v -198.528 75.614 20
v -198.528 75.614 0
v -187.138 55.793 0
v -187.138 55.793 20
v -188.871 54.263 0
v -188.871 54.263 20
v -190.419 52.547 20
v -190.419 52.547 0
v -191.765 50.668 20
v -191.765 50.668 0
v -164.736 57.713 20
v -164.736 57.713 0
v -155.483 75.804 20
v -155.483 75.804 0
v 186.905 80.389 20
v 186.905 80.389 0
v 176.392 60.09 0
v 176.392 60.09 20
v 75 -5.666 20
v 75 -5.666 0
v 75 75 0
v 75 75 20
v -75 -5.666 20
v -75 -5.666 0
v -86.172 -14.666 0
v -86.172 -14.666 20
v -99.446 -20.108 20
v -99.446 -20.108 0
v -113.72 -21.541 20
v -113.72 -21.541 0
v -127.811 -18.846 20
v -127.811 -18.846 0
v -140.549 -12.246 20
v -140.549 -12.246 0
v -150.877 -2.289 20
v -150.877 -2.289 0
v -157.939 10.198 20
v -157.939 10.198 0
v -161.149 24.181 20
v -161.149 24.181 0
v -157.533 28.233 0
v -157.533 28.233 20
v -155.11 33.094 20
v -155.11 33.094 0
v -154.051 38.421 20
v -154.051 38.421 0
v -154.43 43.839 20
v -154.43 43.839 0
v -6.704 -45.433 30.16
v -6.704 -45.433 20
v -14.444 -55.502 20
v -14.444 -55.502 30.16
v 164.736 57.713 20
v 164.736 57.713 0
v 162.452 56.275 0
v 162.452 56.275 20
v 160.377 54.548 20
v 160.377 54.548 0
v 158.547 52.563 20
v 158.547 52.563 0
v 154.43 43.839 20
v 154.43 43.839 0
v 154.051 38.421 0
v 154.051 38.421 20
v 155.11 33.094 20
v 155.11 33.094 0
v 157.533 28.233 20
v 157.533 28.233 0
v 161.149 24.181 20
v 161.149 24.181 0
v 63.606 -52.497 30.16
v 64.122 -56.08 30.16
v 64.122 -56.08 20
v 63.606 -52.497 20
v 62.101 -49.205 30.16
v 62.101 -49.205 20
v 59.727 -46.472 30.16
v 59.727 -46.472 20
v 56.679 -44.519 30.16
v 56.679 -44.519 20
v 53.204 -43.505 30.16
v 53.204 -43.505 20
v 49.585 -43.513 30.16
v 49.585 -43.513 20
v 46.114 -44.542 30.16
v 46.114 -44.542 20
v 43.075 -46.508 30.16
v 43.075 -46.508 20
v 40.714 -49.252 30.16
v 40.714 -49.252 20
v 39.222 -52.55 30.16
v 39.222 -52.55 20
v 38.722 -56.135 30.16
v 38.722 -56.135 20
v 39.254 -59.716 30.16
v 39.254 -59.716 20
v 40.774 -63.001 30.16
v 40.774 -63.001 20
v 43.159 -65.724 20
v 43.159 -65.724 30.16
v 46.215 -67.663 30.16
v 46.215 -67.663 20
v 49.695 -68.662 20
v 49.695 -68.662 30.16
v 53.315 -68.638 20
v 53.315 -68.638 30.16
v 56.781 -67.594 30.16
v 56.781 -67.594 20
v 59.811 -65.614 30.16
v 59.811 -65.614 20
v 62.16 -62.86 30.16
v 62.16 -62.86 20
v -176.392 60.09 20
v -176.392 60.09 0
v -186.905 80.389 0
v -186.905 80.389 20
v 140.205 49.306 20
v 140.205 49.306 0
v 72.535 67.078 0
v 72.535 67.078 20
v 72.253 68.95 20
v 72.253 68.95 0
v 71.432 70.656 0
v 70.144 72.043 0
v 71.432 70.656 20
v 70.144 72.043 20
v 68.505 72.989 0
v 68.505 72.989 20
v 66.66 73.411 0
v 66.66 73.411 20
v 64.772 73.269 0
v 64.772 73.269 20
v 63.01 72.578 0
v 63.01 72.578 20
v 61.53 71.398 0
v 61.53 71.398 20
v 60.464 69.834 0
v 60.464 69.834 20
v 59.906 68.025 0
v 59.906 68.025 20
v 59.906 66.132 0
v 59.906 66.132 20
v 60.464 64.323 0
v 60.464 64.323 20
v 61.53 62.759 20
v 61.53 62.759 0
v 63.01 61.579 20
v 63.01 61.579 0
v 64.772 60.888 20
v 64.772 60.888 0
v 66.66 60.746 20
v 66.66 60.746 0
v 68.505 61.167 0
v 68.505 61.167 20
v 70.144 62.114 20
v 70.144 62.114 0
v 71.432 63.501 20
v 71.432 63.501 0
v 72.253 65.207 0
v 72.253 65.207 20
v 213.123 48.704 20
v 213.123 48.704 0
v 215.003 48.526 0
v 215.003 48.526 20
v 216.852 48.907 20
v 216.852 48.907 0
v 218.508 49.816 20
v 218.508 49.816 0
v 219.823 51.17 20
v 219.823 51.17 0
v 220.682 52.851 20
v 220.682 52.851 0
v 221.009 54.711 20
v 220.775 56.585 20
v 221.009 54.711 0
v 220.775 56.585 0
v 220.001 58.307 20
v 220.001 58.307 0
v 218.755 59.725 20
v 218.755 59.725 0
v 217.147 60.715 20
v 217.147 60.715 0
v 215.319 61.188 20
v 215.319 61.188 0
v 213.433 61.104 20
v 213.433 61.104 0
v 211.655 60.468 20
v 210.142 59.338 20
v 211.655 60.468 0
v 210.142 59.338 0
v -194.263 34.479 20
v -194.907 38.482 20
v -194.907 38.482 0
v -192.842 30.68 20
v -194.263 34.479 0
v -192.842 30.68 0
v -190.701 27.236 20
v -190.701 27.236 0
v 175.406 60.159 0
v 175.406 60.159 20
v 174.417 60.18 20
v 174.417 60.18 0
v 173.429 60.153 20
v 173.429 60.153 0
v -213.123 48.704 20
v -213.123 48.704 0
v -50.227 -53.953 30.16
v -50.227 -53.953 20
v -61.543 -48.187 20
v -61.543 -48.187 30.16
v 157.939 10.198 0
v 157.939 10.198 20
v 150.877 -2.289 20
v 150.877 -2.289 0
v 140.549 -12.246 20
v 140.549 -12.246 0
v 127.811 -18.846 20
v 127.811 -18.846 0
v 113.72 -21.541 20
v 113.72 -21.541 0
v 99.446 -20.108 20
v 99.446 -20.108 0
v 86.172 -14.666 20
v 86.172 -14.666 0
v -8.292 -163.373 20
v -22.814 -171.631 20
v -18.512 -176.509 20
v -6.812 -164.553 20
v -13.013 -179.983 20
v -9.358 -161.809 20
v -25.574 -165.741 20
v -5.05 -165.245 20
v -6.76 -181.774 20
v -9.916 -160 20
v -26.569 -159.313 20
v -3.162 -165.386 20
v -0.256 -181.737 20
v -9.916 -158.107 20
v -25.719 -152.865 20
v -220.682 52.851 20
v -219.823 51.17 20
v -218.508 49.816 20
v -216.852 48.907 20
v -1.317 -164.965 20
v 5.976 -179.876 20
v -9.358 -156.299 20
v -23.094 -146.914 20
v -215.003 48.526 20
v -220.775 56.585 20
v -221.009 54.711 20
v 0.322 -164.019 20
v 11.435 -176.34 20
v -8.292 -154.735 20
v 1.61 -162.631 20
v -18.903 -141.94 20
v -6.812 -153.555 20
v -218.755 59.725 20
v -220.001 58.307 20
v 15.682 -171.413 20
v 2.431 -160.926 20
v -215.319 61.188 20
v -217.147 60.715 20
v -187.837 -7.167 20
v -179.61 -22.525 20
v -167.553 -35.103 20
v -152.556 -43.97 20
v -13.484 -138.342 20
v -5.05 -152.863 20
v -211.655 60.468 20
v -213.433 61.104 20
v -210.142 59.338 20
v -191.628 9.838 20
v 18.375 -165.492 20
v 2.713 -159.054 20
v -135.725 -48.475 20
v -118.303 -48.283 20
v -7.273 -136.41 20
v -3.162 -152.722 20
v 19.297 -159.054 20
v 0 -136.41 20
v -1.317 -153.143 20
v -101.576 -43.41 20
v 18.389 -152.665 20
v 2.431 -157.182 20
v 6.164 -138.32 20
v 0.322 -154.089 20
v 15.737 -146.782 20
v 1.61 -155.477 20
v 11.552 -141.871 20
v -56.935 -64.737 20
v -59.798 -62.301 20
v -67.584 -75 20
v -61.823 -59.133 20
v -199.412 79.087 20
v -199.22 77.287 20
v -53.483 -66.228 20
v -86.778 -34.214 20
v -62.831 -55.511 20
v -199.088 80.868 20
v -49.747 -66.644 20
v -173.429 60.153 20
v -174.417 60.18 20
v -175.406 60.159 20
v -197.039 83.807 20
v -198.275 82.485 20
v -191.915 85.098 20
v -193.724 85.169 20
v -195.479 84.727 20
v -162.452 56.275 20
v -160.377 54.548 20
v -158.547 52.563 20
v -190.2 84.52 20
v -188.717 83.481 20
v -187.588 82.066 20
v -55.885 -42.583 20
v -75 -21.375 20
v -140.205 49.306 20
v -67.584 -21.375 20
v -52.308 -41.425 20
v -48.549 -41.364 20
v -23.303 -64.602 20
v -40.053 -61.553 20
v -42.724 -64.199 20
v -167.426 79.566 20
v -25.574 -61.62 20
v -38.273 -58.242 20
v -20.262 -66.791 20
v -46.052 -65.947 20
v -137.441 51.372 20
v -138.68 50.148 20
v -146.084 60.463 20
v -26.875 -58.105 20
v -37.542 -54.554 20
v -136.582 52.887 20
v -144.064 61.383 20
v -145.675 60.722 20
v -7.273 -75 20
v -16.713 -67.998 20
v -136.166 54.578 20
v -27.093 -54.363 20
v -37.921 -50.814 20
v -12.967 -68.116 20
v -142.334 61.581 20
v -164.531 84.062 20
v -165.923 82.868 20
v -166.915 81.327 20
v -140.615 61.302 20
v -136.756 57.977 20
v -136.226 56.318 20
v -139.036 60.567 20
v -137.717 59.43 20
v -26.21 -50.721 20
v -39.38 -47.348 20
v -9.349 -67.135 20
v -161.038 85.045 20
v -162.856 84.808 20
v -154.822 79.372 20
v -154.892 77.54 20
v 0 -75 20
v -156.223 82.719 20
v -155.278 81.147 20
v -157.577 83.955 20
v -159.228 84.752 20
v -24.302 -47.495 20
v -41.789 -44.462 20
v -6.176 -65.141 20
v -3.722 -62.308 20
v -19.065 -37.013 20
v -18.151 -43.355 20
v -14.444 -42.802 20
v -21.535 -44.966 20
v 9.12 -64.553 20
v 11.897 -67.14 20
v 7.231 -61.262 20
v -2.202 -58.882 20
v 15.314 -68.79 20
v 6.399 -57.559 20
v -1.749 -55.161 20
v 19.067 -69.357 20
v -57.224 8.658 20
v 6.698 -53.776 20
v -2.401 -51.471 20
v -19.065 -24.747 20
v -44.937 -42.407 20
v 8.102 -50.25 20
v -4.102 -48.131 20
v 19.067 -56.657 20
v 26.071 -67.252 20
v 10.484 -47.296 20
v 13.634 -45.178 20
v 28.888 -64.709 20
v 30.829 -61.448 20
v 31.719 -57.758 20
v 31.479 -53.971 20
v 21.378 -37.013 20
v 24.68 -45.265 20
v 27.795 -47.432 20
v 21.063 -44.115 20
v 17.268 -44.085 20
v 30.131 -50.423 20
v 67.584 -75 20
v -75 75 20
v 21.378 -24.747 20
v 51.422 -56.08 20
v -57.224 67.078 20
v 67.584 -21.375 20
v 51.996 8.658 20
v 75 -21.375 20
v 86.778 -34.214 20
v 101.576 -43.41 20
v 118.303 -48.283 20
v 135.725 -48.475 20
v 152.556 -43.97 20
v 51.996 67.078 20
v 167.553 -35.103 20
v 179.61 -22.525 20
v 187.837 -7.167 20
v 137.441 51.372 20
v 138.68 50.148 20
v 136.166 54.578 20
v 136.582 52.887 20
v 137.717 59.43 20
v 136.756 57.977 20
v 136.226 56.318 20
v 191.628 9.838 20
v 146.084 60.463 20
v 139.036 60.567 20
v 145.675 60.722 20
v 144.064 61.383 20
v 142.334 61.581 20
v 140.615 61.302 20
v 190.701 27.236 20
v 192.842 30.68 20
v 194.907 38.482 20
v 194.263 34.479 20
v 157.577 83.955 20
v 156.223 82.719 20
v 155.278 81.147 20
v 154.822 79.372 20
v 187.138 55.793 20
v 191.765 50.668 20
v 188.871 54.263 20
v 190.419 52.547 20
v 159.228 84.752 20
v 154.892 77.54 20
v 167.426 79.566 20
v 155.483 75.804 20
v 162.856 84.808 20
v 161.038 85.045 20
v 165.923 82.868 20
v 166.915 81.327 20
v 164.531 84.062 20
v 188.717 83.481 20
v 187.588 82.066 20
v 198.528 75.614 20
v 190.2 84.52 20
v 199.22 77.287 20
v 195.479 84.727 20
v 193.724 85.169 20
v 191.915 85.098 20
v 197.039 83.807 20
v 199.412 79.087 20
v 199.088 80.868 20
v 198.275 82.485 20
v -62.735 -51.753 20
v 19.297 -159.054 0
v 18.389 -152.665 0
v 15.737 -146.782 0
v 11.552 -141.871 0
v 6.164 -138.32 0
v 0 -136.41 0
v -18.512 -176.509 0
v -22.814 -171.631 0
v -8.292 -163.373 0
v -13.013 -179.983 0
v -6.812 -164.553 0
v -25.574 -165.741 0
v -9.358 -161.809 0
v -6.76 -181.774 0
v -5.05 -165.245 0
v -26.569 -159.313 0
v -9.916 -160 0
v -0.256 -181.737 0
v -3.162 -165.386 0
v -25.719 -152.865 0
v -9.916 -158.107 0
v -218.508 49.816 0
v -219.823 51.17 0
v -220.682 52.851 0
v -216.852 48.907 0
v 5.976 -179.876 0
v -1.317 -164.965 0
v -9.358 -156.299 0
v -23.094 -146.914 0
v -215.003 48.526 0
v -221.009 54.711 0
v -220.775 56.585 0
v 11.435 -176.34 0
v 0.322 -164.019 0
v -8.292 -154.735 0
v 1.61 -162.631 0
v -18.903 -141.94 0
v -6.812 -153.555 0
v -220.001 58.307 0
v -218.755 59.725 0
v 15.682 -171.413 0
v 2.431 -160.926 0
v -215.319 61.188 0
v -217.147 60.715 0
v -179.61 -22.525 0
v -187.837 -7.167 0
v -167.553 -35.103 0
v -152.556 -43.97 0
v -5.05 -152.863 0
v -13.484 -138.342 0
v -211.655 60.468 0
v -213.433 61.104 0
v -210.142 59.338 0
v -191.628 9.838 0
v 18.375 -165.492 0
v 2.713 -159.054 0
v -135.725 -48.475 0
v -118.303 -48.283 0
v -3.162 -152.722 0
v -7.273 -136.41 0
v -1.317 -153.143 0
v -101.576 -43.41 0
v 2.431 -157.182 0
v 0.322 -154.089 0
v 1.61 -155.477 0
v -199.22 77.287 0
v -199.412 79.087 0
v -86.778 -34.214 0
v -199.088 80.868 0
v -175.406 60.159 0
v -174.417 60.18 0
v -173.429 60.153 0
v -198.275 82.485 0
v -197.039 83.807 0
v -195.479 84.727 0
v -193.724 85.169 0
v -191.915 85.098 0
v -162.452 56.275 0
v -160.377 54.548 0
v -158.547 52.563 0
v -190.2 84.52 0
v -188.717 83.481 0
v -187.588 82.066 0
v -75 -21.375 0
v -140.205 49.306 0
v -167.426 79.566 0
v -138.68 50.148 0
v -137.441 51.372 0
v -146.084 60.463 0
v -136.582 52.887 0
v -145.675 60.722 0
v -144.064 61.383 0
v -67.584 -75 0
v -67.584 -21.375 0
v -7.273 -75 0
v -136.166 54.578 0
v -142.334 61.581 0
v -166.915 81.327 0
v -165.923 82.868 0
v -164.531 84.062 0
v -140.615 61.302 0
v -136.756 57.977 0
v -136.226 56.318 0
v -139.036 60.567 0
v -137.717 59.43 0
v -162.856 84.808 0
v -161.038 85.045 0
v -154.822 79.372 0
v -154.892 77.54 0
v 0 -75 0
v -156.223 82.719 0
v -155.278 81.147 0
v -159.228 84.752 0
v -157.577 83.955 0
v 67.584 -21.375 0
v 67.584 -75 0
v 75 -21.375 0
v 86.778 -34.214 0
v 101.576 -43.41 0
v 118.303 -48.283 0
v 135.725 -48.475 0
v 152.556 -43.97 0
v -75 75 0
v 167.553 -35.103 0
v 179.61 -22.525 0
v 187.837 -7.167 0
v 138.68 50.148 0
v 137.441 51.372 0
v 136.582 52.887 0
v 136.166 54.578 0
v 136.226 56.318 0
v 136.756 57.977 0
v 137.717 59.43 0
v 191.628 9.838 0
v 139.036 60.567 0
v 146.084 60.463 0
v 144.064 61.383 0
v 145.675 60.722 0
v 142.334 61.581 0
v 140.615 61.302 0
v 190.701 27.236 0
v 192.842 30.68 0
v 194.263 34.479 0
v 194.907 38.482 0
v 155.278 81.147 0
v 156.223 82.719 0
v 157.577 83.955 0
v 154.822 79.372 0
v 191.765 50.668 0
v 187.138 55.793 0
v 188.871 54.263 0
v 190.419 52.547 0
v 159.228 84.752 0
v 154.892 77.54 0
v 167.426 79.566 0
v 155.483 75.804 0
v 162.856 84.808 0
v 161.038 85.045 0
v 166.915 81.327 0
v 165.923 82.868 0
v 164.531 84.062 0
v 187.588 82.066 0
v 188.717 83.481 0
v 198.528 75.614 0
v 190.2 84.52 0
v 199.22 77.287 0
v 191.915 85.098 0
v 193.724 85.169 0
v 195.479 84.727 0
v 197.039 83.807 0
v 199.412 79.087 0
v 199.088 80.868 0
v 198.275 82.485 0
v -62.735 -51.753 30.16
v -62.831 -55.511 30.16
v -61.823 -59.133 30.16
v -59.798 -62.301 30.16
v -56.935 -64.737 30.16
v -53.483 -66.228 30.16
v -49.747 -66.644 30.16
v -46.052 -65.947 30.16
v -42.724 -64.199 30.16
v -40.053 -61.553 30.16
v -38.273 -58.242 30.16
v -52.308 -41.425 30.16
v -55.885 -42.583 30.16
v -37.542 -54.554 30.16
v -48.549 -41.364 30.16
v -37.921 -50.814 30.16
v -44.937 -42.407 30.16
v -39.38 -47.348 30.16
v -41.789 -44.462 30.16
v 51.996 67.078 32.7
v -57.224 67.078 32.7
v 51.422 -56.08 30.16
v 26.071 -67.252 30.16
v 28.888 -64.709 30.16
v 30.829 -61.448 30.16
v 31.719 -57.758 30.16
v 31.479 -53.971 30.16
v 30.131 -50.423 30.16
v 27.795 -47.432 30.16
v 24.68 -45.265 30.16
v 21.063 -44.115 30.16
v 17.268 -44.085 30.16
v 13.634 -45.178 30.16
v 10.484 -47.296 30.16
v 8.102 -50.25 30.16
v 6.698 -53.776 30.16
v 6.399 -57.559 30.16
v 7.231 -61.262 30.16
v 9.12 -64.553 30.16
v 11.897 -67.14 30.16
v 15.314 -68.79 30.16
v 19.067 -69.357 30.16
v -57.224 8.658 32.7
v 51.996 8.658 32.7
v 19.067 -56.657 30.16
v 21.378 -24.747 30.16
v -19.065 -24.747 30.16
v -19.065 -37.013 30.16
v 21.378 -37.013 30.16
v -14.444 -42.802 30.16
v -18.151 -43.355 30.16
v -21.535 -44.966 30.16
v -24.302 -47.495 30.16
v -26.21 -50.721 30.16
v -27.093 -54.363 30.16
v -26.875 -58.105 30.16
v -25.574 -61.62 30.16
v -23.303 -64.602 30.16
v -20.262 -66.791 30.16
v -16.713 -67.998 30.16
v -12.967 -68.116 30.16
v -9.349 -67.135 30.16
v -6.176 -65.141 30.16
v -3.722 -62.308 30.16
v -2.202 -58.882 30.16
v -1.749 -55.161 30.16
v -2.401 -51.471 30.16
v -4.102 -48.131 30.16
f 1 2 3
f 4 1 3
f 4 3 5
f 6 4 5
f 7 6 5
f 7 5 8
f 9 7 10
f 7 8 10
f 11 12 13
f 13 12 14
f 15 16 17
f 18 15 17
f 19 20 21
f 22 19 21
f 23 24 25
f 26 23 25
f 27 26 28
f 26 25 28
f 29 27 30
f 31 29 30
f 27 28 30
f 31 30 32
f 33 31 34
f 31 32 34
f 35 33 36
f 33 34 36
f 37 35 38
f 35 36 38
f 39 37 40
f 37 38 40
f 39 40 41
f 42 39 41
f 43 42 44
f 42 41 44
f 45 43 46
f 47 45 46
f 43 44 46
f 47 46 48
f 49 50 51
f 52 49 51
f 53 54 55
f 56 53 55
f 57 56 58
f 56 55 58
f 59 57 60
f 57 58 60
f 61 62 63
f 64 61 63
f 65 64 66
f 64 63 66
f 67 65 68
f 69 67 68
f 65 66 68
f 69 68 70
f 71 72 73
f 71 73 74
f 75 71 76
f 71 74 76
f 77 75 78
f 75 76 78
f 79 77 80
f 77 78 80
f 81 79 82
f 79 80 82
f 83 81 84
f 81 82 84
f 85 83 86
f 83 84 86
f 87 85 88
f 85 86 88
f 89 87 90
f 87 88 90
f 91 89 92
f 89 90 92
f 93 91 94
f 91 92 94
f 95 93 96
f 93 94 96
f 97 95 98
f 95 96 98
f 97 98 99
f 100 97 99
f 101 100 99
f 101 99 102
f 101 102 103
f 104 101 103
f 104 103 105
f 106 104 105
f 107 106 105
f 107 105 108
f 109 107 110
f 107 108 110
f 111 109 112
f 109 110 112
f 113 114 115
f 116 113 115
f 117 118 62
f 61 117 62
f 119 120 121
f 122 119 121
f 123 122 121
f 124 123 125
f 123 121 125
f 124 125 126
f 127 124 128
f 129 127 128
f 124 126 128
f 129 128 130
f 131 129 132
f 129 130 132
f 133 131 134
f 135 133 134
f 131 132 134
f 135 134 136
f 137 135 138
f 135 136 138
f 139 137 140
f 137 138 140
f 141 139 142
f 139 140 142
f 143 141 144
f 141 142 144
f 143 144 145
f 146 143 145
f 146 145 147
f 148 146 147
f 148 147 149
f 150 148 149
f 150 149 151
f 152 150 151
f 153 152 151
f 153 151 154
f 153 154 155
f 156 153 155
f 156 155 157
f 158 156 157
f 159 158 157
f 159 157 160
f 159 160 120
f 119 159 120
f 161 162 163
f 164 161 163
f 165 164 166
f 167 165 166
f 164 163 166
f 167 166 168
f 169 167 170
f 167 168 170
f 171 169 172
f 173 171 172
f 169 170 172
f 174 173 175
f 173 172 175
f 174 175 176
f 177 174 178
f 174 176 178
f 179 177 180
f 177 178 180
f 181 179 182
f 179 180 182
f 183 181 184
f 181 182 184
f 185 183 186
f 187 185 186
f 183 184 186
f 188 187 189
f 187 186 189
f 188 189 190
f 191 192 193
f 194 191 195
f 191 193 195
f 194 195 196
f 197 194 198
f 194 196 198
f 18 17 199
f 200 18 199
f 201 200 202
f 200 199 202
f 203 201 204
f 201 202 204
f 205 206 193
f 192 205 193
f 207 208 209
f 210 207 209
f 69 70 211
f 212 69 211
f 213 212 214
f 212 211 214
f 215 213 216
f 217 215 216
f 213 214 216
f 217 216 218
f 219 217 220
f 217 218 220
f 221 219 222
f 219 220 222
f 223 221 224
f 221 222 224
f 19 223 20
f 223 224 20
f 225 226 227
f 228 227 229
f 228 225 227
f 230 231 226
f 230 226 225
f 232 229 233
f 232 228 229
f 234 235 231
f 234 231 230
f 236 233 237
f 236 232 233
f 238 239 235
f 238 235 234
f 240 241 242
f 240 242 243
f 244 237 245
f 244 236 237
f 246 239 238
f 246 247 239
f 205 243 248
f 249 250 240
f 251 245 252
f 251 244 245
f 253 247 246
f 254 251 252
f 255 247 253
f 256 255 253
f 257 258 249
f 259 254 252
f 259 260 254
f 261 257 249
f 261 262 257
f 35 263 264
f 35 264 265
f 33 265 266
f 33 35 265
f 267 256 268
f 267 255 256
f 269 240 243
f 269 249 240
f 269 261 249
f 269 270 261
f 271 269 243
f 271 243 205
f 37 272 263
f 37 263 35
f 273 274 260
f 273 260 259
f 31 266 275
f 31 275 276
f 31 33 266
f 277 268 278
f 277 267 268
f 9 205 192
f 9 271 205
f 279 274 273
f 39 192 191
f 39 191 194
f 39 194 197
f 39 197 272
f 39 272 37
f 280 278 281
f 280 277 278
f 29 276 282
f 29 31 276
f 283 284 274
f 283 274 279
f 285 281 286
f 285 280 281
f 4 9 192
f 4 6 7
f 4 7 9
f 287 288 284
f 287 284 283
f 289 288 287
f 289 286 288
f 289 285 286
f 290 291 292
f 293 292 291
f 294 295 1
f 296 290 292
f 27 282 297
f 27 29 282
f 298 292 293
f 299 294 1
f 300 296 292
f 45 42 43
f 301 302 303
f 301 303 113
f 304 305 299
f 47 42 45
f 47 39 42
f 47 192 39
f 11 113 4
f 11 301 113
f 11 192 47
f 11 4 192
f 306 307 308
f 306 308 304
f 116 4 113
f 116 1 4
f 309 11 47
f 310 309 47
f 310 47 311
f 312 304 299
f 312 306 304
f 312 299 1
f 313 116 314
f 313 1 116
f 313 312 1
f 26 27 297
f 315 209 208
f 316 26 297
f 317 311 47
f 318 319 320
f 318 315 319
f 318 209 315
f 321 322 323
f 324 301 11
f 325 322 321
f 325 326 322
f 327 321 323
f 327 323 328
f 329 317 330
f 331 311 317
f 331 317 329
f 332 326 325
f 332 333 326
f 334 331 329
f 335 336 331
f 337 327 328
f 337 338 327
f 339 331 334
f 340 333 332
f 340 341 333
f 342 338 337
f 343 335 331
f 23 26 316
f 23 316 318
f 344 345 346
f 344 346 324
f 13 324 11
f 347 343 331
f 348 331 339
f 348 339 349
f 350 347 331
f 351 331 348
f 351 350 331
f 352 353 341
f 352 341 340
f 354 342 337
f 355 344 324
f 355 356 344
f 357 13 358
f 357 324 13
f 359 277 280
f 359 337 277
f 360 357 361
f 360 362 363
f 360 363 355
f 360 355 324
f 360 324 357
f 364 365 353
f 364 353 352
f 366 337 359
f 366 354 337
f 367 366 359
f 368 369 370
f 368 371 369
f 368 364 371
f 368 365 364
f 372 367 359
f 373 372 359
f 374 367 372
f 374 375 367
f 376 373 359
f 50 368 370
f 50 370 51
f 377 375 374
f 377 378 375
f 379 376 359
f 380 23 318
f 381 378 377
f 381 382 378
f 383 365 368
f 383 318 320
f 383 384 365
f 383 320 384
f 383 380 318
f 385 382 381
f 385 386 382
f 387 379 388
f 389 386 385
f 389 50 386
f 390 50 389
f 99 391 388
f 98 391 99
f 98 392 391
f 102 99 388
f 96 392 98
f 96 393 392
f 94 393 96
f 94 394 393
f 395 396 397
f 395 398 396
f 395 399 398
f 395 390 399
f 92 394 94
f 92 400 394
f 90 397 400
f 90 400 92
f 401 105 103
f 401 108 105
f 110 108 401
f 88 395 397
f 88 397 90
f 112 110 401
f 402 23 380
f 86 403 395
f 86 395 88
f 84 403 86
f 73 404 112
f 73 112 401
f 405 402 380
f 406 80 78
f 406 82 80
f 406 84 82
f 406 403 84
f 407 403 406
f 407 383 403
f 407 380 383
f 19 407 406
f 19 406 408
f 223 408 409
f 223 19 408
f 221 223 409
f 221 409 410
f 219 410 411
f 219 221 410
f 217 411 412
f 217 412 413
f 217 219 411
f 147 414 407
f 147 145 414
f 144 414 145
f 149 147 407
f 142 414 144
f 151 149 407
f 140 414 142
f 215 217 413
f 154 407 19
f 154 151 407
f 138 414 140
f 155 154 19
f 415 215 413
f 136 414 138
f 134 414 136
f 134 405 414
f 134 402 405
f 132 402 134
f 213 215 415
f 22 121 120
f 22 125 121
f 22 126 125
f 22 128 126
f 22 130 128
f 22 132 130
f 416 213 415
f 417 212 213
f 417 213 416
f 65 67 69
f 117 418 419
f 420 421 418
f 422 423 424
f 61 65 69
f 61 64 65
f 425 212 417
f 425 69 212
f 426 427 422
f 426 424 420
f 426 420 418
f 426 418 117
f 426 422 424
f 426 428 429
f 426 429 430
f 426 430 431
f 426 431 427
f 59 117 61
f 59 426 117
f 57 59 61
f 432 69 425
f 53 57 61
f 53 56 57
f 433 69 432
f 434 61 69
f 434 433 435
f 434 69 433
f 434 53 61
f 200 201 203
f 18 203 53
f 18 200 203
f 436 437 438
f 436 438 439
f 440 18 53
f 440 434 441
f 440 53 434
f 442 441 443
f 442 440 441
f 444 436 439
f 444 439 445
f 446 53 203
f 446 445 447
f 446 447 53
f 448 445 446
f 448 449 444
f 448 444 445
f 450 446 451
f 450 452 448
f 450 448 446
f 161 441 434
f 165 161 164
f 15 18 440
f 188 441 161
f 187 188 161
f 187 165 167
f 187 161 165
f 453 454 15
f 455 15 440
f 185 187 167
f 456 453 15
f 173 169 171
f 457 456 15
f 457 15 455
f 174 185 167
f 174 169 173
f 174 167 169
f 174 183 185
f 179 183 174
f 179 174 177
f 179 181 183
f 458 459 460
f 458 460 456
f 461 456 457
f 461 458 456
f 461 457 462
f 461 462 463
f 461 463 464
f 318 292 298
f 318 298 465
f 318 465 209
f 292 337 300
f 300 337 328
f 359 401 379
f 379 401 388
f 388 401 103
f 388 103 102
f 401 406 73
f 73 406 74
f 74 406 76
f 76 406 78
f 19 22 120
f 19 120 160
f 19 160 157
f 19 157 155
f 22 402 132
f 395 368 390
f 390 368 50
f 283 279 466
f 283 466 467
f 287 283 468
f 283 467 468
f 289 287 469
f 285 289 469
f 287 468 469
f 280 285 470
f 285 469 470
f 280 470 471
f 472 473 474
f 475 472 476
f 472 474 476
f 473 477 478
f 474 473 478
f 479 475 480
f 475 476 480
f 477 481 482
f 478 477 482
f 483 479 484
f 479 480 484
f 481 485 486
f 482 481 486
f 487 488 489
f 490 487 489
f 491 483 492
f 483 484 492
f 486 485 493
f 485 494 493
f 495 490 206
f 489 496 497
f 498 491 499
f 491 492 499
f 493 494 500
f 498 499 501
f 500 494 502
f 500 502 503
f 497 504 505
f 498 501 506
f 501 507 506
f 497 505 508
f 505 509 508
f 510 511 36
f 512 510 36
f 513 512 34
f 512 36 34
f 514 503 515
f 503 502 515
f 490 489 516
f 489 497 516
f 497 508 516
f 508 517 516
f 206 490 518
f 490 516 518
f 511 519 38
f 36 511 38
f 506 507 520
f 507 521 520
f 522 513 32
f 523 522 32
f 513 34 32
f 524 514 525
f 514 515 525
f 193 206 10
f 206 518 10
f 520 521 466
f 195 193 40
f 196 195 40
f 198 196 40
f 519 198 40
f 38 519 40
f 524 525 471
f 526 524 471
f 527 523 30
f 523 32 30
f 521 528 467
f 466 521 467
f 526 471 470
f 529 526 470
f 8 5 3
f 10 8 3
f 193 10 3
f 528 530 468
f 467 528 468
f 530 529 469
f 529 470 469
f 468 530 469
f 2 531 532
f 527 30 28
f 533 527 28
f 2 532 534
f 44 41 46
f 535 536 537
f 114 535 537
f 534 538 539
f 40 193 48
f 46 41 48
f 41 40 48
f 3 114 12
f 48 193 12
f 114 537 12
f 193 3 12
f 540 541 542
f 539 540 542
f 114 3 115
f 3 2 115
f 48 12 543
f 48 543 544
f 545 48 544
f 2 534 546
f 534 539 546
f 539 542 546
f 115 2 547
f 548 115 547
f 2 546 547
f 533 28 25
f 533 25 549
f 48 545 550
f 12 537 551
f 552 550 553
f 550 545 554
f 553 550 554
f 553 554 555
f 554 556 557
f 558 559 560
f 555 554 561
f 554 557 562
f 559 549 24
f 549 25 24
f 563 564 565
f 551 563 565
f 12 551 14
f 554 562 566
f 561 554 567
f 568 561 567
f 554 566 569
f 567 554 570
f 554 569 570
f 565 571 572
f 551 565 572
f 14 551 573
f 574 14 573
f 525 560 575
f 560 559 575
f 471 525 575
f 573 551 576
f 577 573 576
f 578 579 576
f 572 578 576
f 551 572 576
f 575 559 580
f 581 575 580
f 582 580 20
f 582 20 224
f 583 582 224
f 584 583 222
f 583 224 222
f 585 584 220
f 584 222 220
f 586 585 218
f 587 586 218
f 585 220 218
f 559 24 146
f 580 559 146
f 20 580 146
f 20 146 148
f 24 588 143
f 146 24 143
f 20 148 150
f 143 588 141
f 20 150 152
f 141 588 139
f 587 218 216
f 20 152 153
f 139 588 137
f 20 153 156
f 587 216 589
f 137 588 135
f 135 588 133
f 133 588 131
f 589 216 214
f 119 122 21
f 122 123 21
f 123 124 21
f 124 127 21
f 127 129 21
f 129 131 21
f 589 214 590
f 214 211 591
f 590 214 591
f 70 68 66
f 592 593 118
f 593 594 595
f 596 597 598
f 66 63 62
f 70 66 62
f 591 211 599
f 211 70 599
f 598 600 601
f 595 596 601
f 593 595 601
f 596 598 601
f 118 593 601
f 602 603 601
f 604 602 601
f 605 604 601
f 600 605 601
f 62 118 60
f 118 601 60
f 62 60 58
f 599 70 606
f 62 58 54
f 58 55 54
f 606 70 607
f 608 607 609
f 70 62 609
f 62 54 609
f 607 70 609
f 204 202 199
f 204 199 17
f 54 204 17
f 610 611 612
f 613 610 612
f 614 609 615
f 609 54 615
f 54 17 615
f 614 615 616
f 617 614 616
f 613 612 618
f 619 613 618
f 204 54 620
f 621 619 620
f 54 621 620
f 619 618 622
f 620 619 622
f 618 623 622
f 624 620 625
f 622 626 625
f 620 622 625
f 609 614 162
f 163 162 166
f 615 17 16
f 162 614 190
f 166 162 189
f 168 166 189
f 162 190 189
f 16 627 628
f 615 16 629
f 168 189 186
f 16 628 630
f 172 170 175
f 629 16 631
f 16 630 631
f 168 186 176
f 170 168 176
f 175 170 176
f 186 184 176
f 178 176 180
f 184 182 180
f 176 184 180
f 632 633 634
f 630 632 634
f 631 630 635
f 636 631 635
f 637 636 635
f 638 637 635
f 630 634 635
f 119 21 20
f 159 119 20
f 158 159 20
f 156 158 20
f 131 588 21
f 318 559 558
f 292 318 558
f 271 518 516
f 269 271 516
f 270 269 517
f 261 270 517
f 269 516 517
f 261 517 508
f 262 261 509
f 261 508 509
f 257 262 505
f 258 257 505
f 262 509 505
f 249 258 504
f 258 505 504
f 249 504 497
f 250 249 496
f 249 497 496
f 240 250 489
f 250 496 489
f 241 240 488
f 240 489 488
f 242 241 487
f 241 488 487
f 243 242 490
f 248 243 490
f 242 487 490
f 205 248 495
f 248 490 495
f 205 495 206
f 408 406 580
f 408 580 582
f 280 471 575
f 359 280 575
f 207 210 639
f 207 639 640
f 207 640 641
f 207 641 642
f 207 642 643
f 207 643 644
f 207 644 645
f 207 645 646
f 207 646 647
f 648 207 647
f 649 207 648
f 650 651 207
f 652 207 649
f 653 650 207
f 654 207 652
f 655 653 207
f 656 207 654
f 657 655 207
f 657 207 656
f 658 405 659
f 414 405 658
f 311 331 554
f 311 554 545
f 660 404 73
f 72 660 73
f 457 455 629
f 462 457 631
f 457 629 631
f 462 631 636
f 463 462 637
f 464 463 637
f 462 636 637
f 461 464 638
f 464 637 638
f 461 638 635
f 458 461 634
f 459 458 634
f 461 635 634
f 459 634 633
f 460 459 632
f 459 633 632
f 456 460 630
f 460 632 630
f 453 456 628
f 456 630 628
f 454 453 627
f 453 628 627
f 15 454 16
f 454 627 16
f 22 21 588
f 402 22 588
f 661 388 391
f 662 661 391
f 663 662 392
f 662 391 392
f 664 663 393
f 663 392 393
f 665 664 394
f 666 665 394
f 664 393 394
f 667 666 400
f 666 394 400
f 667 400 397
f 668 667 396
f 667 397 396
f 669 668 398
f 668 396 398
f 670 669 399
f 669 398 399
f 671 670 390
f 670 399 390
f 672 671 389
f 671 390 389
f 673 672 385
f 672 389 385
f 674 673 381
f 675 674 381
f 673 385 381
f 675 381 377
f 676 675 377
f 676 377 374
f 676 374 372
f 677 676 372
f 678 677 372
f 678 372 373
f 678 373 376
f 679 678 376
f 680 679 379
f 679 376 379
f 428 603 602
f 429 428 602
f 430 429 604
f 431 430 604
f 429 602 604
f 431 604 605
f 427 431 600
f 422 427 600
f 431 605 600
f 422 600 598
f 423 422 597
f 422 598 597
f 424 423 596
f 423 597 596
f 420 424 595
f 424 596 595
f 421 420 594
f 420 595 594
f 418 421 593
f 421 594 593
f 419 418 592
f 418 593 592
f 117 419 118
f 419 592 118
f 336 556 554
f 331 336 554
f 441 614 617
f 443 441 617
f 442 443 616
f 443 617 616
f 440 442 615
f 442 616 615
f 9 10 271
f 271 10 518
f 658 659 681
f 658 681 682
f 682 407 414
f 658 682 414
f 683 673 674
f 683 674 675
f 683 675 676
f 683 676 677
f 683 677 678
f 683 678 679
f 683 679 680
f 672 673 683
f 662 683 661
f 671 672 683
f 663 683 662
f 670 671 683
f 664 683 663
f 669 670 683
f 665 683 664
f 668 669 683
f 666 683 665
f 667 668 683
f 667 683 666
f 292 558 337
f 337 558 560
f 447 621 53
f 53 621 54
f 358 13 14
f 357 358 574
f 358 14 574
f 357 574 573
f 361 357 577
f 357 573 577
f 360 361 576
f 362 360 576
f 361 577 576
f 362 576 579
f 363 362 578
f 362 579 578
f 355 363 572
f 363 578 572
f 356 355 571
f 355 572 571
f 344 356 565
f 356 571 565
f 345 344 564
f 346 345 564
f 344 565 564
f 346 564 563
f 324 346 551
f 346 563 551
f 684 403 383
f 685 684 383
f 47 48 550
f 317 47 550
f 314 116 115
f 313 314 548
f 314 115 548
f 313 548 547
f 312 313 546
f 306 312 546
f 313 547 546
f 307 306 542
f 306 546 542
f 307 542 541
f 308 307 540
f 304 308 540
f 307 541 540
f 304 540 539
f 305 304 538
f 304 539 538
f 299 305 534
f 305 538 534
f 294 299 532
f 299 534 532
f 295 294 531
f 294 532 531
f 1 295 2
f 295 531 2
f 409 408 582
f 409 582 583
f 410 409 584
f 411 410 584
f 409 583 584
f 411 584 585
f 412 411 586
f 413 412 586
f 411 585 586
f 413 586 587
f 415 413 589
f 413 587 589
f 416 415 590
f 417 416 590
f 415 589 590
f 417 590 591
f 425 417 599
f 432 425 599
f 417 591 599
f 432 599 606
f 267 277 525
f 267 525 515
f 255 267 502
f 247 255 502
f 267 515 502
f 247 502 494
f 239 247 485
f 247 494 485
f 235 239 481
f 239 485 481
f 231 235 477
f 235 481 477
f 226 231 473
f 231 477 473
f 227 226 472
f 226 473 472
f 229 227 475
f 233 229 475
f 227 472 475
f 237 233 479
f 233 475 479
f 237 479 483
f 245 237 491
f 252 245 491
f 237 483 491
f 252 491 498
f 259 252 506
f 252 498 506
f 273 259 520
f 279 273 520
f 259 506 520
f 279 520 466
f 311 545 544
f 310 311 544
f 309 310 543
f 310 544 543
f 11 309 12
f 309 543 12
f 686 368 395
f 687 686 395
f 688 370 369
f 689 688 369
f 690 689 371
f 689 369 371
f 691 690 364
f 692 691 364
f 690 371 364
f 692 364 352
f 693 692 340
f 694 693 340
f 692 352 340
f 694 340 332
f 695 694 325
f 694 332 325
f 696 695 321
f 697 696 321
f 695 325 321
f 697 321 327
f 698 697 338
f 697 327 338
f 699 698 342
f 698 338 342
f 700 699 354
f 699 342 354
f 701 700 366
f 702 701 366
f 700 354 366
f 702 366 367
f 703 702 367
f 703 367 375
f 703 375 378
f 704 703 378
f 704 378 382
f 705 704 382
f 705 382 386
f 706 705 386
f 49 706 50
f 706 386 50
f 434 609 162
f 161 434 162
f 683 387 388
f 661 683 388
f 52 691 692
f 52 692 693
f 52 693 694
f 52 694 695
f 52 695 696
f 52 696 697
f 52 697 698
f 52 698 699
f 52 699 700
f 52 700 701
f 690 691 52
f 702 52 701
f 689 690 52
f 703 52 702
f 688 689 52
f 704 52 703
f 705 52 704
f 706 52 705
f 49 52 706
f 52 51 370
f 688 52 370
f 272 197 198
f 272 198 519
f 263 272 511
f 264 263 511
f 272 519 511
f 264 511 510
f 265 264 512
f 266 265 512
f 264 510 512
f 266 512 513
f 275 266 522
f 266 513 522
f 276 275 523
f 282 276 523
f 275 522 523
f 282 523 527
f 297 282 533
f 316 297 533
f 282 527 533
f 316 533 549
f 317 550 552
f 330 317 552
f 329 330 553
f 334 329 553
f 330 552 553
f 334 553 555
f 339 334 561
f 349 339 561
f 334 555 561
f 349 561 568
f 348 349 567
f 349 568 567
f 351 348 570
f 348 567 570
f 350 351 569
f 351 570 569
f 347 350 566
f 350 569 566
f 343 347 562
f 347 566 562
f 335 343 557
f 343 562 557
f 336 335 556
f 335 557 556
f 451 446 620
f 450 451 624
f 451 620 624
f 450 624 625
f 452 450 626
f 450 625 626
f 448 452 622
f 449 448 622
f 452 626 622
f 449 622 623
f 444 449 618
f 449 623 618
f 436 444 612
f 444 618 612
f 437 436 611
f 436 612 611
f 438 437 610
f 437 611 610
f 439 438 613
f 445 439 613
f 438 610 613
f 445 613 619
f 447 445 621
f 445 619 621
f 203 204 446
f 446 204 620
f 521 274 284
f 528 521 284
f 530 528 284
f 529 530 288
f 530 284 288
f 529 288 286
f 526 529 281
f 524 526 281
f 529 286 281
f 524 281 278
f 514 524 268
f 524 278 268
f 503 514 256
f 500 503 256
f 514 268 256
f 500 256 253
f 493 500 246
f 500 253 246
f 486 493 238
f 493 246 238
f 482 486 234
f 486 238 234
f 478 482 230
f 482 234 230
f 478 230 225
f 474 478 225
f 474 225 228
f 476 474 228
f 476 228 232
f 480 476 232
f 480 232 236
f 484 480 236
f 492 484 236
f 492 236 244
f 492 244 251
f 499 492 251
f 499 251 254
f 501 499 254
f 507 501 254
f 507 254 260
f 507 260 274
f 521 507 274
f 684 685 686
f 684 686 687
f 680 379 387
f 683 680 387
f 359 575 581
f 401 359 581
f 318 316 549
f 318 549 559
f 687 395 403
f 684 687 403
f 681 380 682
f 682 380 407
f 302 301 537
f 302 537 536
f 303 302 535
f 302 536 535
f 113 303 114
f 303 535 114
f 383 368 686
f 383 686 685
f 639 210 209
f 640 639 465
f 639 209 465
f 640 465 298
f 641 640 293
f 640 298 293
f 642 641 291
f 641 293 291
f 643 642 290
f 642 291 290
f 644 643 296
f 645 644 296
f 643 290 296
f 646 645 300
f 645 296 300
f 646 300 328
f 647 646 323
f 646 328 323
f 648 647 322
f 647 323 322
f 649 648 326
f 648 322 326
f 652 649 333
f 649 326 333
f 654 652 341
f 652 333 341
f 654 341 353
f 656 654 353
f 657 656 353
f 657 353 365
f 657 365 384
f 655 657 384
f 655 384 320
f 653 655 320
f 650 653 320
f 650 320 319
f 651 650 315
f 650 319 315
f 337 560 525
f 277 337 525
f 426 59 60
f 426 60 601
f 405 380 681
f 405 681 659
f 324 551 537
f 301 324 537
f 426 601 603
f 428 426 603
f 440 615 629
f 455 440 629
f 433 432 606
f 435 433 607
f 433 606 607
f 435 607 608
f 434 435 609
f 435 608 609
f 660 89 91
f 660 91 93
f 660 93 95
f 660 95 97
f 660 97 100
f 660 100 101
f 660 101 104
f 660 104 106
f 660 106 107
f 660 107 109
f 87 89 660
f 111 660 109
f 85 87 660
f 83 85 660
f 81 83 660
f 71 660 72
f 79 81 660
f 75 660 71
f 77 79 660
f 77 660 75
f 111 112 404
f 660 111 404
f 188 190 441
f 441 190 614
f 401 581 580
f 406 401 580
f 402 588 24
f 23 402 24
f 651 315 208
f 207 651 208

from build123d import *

# Parameters (mm, degrees)
F0_R     = 4.2534442679
F1_DEPTH = 20
F2_W     = 10.3906942531
F2_H     = 12.2660957277
F2_W_2   = 9.8304990679
F2_W_3   = 9.2522380874
F2_W_4   = 10.9689552337
F3_DEPTH = 10.16
F5_R     = 6.35
F6_DEPTH = 25.4
F7_R     = 6.35
F8_DEPTH = 25.4
F4_W     = 109.22
F4_H     = 58.420000254
F9_DEPTH = 12.7


# Not quite as in the source:
# - a feature names something its author has since deleted; it is built from what else it names


with BuildPart() as f1:
    # F0 (on Top) → F1 (new body)
    with BuildSketch(Plane.XY):
        Polygon((-67.5837442279, -21.374759078), (-67.5837442279, -75), (-7.2734476998, -75), (0, -75), (67.5837334, -75), (67.5837334, -21.374759078), (75, -21.374759078), (75, -5.6661395316), (75, 75), (-75, 75), (-75, -5.6661395316), (-75, -21.374759078), align=None)
        with BuildLine():
            ThreePointArc((-190.7009859405, 27.2364963511), (-152.5558792144, -43.9704630954), (-75, -21.374759078))
            Line((-75, -21.374759078), (-75, -5.6661395316))
            ThreePointArc((-75, -5.6661395316), (-127.811049195, -18.8460311242), (-161.148882109, 24.1807669913))
            ThreePointArc((-161.148882109, 24.1807669913), (-155.1100282823, 33.0940415029), (-154.4303864618, 43.8389149342))
            Line((-154.4303864618, 43.8389149342), (-140.2046696458, 49.3057770206))
            ThreePointArc((-140.2046696458, 49.3057770206), (-136.7560169722, 57.9771637157), (-145.6751462177, 60.7222112528))
            Line((-145.6751462177, 60.7222112528), (-146.0841166448, 60.4629836272))
            Line((-146.0841166448, 60.4629836272), (-158.5471573729, 52.5632328352))
            ThreePointArc((-158.5471573729, 52.5632328352), (-161.385975302, 55.4455313061), (-164.7362764103, 57.7131322838))
            Line((-164.7362764103, 57.7131322838), (-155.482622785, 75.8038009996))
            ThreePointArc((-155.482622785, 75.8038009996), (-159.2281719938, 84.7522052149), (-167.4260348338, 79.5658652979))
            Line((-167.4260348338, 79.5658652979), (-173.4289959882, 60.1528063587))
            ThreePointArc((-173.4289959882, 60.1528063587), (-174.9118696964, 60.1750253912), (-176.3924593558, 60.0898057902))
            Line((-176.3924593558, 60.0898057902), (-186.9047044679, 80.3893698915))
            ThreePointArc((-186.9047044679, 80.3893698915), (-195.4793934942, 84.7270210192), (-198.5276463049, 75.6139170472))
            Line((-198.5276463049, 75.6139170472), (-187.1383609375, 55.7931254681))
            ThreePointArc((-187.1383609375, 55.7931254681), (-189.6692112484, 53.4271036789), (-191.7647204388, 50.6680995766))
            Line((-191.7647204388, 50.6680995766), (-210.142074272, 59.3384667019))
            ThreePointArc((-210.142074272, 59.3384667019), (-220.775202398, 56.5846111171), (-213.1234756292, 48.7043692565))
            Line((-213.1234756292, 48.7043692565), (-194.9065059539, 38.4823538939))
            ThreePointArc((-194.9065059539, 38.4823538939), (-193.6469430671, 32.5441016935), (-190.7009859405, 27.2364963511))
        make_face()
        with BuildLine():
            Line((75, -5.6661395316), (75, -21.374759078))
            ThreePointArc((75, -21.374759078), (152.5558792144, -43.9704630954), (190.7009859405, 27.2364963511))
            ThreePointArc((190.7009859405, 27.2364963511), (193.6469430671, 32.5441016935), (194.9065059539, 38.4823538939))
            Line((194.9065059539, 38.4823538939), (213.1234756292, 48.7043692565))
            ThreePointArc((213.1234756292, 48.7043692565), (220.775202398, 56.5846111171), (210.142074272, 59.3384667019))
            Line((210.142074272, 59.3384667019), (191.7647204388, 50.6680995766))
            ThreePointArc((191.7647204388, 50.6680995766), (189.6692112484, 53.4271036789), (187.1383609375, 55.7931254681))
            Line((187.1383609375, 55.7931254681), (198.5276463049, 75.6139170472))
            ThreePointArc((198.5276463049, 75.6139170472), (195.4793934942, 84.7270210192), (186.9047044679, 80.3893698915))
            Line((186.9047044679, 80.3893698915), (176.3924593558, 60.0898057902))
            ThreePointArc((176.3924593558, 60.0898057902), (174.9118696964, 60.1750253912), (173.4289959882, 60.1528063587))
            Line((173.4289959882, 60.1528063587), (167.4260348338, 79.5658652979))
            ThreePointArc((167.4260348338, 79.5658652979), (159.2281719938, 84.7522052149), (155.482622785, 75.8038009996))
            Line((155.482622785, 75.8038009996), (164.7362764103, 57.7131322838))
            ThreePointArc((164.7362764103, 57.7131322838), (161.385975302, 55.4455313061), (158.5471573729, 52.5632328352))
            Line((158.5471573729, 52.5632328352), (146.0841166448, 60.4629836272))
            Line((146.0841166448, 60.4629836272), (145.6751462177, 60.7222112528))
            ThreePointArc((145.6751462177, 60.7222112528), (136.7560169722, 57.9771637157), (140.2046696458, 49.3057770206))
            Line((140.2046696458, 49.3057770206), (154.4303864618, 43.8389149342))
            ThreePointArc((154.4303864618, 43.8389149342), (155.1100282823, 33.0940415029), (161.148882109, 24.1807669913))
            ThreePointArc((161.148882109, 24.1807669913), (127.811049195, -18.8460311242), (75, -5.6661395316))
        make_face()
        with BuildLine():
            Line((0, -75), (-7.2734476998, -75))
            Line((-7.2734476998, -75), (-7.2734476998, -136.4104553148))
            ThreePointArc((-7.2734476998, -136.4104553148), (-3.6367238499, -136.120270713), (0, -136.4104553148))
            Line((0, -136.4104553148), (0, -75))
        make_face()
        with BuildLine():
            ThreePointArc((0, -136.4104553148), (-3.6367238499, -136.120270713), (-7.2734476998, -136.4104553148))
            ThreePointArc((-7.2734476998, -136.4104553148), (-18.5120008809, -176.508894443), (19.2968973343, -159.0538918972))
            ThreePointArc((19.2968973343, -159.0538918972), (13.8182786959, -144.1786148662), (0, -136.4104553148))
        make_face()
        with Locations((-3.6367238499, -159.0538918972)):
            Circle(F0_R, mode=Mode.SUBTRACT)
        with Locations((-3.6367238499, -159.0538918972)):
            Circle(F0_R)
    extrude(amount=F1_DEPTH)

    # F2 (on face) → F3 (join)
    with BuildSketch(Plane.XY.offset(20)):
        with Locations((-13.8693177141, -30.8799799532)):
            Rectangle(F2_W, F2_H)
        with Locations((-3.7587210536, -30.8799799532)):
            Rectangle(F2_W_2, F2_H)
        with Locations((5.782647524, -30.8799799532)):
            Rectangle(F2_W_3, F2_H)
        with Locations((15.8932441846, -30.8799799532)):
            Rectangle(F2_W_4, F2_H)
        with BuildLine():
            Line((-50.2273030579, -53.9529807866), (-61.5431257083, -48.187379539))
            ThreePointArc((-61.5431257083, -48.187379539), (-41.2897769448, -62.9757645575), (-55.8852143831, -42.5829306795))
            Line((-55.8852143831, -42.5829306795), (-50.2273030579, -53.9529807866))
        make_face()
        with BuildLine():
            Line((-14.4444061443, -55.5018670857), (-14.4444061443, -42.8018670857))
            ThreePointArc((-14.4444061443, -42.8018670857), (-18.5320544995, -67.5260564939), (-6.7041450331, -45.4331850503))
            Line((-6.7041450331, -45.4331850503), (-14.4444061443, -55.5018670857))
        make_face()
        with BuildLine():
            Line((19.0666168928, -56.657422334), (26.0705094181, -67.2515475689))
            ThreePointArc((26.0705094181, -67.2515475689), (15.4098006877, -44.4952804485), (19.0666168928, -69.357422334))
            Line((19.0666168928, -69.357422334), (19.0666168928, -56.657422334))
        make_face()
        with BuildLine():
            Line((51.4220893383, -56.0796447098), (64.1220893383, -56.0796447098))
            ThreePointArc((64.1220893383, -56.0796447098), (39.2223619287, -52.550246584), (62.1604119949, -62.8603840886))
            Line((62.1604119949, -62.8603840886), (51.4220893383, -56.0796447098))
        make_face()
    extrude(amount=F3_DEPTH)

    # F5 (on face) → F6 (cut)
    with BuildSketch(Plane.XY.offset(20)):
        with Locations((-3.6367238499, -159.0538918972)):
            Circle(F5_R)
    extrude(amount=-F6_DEPTH, mode=Mode.SUBTRACT)

    # F7 (on face) → F8 (cut)
    with BuildSketch(Plane.XY.offset(20)):
        with Locations((66.185079515, 67.0784339309)):
            Circle(F7_R)
    extrude(amount=-F8_DEPTH, mode=Mode.SUBTRACT)

    # F4 (on face) → F9 (join)
    with BuildSketch(Plane.XY.offset(20)):
        with Locations((-2.614335165, 37.8684338039)):
            Rectangle(F4_W, F4_H)
    extrude(amount=F9_DEPTH)


solid = f1.part
